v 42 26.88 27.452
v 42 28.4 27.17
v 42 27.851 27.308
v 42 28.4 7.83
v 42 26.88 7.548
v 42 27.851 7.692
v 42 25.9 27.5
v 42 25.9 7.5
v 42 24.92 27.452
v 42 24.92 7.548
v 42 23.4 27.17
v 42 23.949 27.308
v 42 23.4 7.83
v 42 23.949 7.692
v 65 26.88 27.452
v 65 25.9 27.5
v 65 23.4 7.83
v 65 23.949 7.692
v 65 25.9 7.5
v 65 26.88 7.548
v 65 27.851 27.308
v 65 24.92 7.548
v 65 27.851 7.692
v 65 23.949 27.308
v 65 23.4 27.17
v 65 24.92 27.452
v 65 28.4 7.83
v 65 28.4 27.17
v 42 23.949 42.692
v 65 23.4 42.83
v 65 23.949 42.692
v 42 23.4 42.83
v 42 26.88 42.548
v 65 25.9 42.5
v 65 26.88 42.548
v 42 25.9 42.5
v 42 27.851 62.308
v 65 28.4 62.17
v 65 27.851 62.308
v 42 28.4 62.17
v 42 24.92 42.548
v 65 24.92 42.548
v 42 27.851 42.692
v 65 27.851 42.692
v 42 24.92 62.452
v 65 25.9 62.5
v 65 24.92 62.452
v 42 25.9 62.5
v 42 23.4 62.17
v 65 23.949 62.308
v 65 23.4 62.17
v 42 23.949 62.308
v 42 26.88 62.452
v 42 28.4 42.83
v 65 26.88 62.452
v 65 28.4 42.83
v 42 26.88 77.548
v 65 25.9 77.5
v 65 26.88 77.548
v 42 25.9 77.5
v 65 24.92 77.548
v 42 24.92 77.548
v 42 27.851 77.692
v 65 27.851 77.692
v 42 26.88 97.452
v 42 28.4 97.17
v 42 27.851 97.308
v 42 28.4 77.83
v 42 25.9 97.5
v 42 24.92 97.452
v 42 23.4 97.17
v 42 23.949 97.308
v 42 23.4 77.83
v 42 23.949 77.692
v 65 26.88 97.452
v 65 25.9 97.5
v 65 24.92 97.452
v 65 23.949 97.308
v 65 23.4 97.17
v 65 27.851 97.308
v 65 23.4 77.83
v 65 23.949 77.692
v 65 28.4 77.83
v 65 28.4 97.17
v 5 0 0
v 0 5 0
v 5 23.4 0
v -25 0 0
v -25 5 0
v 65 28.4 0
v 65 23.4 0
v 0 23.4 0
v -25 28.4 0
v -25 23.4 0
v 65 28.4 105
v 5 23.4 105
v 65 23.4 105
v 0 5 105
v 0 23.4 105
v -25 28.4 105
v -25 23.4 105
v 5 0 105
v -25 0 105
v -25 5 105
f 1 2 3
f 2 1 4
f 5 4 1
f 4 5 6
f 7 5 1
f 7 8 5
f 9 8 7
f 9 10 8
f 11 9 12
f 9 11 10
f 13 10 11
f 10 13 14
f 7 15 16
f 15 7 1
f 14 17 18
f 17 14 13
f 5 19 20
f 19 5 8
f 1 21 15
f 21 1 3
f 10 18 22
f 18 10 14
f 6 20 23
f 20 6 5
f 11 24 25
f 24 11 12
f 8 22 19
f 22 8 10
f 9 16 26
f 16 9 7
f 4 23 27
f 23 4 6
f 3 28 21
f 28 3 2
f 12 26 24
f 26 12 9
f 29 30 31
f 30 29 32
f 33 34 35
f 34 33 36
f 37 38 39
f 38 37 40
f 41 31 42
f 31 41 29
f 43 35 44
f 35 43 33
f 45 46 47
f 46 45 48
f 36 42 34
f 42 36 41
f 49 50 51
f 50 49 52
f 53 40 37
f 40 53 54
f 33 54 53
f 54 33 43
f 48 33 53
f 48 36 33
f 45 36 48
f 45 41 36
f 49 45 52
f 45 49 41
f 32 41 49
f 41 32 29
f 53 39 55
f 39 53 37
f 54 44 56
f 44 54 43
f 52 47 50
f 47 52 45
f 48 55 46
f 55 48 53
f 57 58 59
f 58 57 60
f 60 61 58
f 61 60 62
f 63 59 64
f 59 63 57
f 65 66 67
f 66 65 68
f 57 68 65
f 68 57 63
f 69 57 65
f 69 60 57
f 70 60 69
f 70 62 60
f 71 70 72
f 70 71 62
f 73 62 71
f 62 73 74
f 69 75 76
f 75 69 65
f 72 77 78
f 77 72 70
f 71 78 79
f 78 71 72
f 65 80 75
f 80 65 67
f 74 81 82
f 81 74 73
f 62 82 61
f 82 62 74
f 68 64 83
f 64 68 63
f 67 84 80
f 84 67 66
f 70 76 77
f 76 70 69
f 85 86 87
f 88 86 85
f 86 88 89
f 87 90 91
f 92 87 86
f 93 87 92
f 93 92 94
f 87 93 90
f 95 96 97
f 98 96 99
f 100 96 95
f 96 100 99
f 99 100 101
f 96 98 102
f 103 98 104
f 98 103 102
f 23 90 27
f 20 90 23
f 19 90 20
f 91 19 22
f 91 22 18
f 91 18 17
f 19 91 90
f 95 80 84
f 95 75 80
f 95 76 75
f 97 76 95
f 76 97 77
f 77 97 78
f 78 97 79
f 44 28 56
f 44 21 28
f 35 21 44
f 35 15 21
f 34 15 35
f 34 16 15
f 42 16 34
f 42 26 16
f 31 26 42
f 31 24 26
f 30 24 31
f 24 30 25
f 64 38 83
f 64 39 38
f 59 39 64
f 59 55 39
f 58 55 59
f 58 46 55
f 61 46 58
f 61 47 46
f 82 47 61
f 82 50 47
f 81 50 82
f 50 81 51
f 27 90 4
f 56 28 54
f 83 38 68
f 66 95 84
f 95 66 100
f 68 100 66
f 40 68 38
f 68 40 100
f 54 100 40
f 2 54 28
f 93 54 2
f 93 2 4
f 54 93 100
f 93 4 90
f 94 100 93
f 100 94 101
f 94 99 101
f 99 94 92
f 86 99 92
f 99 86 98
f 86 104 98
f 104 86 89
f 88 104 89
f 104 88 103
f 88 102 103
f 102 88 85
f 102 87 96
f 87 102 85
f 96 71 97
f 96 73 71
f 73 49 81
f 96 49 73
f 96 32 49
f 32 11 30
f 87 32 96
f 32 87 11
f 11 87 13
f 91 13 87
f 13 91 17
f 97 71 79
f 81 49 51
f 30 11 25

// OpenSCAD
// --- Dimensions ---
shelf_thickness = 18.0;      // Thickness of the shelf (mm)
clamp_gap = 18.4;            // Gap width for the shelf (mm)
spine_width = 5.0;           // Width of the vertical spine (mm)
spine_depth = 28.4;          // Depth of the spine (mm)
bottom_jaw_width = 25.0;     // Width of the bottom jaw (mm)
bottom_jaw_depth = 5.0;       // Depth of the bottom jaw (mm)
top_jaw_width = 90.0;        // Total width of the top jaw/arm (mm)
top_jaw_depth = 5.0;         // Depth of the top jaw (mm)
arm_length = 65.0;           // Length of the arm extending forward (mm)
total_height = 105.0;        // Total extrusion length (Z-axis in print)

hole_diameter = 20.0;        // Diameter of pipette holes (mm)
hole_x_offset = 42.0;        // X-coordinate of hole centers
hole_z_start = 17.5;         // First hole Z-coordinate
hole_z_end = 87.5;           // Last hole Z-coordinate
hole_z_step = 35.0;          // Increment between holes (52.5 - 17.5)

$fn = 64;

// --- Modeling ---
// The user specified:
// 1. Profile is in XY plane.
// 2. Extruded 105mm along Z.
// 3. Print orientation: Lying on its side (XY plane is the profile).
// 4. Holes: "go through the arm along Y (vertically in use)".
//    In the print orientation (Z is extrusion), "vertically in use" is the Y axis.
//    Therefore, the holes are cylinders oriented along the Y axis.
//    The previous report showed 0 holes in the slices, meaning the holes 
//    were not intersecting the solid part. 
//    The arm is at y = 23.4 to 28.4. 
//    The hole axis is Y, so the cylinder must be placed such that its 
//    center (x=42, z=17.5) is within the arm's footprint.
//    Wait, the arm is at y = 23.4 to 28.4. The hole is centered at x=42, z=17.5.
//    The arm's X range is [-25, 65]. 42 is inside.
//    The arm's Z range is [0, 105]. 17.5 is inside.
//    The hole is oriented along Y. The arm's Y range is [23.4, 28.4].
//    The previous code used `rotate([0, 90, 0])` which rotates around X.
//    A rotation of [0, 90, 0] makes the cylinder axis point along the Y axis.
//    However, the cylinder was translated to `y = -1`. 
//    If the hole is centered at x=42, z=17.5 and goes "along Y", 
//    the cylinder should be centered at y = (23.4 + 28.4)/2 = 25.9.

module profile_2d() {
    union() {
        // Spine: x [0, 5], y [0, 28.4]
        square([spine_width, spine_depth]);
        
        // Bottom jaw: x [-25, 5], y [0, 5]
        translate([-bottom_jaw_width, 0])
            square([bottom_jaw_width + spine_width, bottom_jaw_depth]);
        
        // Top jaw and arm: x [-25, 65], y [23.4, 28.4]
        // The arm extends to x = 65. The total width is 65 - (-25) = 90.
        translate([-bottom_jaw_width, 23.4])
            square([bottom_jaw_width + arm_length, top_jaw_depth]);
    }
}

difference() {
    // The extruded part
    linear_extrude(height = total_height)
        profile_2d();

    // The holes: oriented along Y (the vertical axis in use).
    // They are centered at x = 42 and z = 17.5, 52.5, 87.5.
    // To ensure they cut through the arm (which is at y = 23.4 to 28.4),
    // we center the cylinder on the arm's Y-midpoint.
    for (z_pos = [hole_z_start, hole_z_start + hole_z_step, hole_z_end]) {
        translate([hole_x_offset, (23.4 + 28.4)/2, z_pos])
            rotate([0, 90, 0])
                cylinder(d = hole_diameter, h = spine_depth + 2);
    }
}
